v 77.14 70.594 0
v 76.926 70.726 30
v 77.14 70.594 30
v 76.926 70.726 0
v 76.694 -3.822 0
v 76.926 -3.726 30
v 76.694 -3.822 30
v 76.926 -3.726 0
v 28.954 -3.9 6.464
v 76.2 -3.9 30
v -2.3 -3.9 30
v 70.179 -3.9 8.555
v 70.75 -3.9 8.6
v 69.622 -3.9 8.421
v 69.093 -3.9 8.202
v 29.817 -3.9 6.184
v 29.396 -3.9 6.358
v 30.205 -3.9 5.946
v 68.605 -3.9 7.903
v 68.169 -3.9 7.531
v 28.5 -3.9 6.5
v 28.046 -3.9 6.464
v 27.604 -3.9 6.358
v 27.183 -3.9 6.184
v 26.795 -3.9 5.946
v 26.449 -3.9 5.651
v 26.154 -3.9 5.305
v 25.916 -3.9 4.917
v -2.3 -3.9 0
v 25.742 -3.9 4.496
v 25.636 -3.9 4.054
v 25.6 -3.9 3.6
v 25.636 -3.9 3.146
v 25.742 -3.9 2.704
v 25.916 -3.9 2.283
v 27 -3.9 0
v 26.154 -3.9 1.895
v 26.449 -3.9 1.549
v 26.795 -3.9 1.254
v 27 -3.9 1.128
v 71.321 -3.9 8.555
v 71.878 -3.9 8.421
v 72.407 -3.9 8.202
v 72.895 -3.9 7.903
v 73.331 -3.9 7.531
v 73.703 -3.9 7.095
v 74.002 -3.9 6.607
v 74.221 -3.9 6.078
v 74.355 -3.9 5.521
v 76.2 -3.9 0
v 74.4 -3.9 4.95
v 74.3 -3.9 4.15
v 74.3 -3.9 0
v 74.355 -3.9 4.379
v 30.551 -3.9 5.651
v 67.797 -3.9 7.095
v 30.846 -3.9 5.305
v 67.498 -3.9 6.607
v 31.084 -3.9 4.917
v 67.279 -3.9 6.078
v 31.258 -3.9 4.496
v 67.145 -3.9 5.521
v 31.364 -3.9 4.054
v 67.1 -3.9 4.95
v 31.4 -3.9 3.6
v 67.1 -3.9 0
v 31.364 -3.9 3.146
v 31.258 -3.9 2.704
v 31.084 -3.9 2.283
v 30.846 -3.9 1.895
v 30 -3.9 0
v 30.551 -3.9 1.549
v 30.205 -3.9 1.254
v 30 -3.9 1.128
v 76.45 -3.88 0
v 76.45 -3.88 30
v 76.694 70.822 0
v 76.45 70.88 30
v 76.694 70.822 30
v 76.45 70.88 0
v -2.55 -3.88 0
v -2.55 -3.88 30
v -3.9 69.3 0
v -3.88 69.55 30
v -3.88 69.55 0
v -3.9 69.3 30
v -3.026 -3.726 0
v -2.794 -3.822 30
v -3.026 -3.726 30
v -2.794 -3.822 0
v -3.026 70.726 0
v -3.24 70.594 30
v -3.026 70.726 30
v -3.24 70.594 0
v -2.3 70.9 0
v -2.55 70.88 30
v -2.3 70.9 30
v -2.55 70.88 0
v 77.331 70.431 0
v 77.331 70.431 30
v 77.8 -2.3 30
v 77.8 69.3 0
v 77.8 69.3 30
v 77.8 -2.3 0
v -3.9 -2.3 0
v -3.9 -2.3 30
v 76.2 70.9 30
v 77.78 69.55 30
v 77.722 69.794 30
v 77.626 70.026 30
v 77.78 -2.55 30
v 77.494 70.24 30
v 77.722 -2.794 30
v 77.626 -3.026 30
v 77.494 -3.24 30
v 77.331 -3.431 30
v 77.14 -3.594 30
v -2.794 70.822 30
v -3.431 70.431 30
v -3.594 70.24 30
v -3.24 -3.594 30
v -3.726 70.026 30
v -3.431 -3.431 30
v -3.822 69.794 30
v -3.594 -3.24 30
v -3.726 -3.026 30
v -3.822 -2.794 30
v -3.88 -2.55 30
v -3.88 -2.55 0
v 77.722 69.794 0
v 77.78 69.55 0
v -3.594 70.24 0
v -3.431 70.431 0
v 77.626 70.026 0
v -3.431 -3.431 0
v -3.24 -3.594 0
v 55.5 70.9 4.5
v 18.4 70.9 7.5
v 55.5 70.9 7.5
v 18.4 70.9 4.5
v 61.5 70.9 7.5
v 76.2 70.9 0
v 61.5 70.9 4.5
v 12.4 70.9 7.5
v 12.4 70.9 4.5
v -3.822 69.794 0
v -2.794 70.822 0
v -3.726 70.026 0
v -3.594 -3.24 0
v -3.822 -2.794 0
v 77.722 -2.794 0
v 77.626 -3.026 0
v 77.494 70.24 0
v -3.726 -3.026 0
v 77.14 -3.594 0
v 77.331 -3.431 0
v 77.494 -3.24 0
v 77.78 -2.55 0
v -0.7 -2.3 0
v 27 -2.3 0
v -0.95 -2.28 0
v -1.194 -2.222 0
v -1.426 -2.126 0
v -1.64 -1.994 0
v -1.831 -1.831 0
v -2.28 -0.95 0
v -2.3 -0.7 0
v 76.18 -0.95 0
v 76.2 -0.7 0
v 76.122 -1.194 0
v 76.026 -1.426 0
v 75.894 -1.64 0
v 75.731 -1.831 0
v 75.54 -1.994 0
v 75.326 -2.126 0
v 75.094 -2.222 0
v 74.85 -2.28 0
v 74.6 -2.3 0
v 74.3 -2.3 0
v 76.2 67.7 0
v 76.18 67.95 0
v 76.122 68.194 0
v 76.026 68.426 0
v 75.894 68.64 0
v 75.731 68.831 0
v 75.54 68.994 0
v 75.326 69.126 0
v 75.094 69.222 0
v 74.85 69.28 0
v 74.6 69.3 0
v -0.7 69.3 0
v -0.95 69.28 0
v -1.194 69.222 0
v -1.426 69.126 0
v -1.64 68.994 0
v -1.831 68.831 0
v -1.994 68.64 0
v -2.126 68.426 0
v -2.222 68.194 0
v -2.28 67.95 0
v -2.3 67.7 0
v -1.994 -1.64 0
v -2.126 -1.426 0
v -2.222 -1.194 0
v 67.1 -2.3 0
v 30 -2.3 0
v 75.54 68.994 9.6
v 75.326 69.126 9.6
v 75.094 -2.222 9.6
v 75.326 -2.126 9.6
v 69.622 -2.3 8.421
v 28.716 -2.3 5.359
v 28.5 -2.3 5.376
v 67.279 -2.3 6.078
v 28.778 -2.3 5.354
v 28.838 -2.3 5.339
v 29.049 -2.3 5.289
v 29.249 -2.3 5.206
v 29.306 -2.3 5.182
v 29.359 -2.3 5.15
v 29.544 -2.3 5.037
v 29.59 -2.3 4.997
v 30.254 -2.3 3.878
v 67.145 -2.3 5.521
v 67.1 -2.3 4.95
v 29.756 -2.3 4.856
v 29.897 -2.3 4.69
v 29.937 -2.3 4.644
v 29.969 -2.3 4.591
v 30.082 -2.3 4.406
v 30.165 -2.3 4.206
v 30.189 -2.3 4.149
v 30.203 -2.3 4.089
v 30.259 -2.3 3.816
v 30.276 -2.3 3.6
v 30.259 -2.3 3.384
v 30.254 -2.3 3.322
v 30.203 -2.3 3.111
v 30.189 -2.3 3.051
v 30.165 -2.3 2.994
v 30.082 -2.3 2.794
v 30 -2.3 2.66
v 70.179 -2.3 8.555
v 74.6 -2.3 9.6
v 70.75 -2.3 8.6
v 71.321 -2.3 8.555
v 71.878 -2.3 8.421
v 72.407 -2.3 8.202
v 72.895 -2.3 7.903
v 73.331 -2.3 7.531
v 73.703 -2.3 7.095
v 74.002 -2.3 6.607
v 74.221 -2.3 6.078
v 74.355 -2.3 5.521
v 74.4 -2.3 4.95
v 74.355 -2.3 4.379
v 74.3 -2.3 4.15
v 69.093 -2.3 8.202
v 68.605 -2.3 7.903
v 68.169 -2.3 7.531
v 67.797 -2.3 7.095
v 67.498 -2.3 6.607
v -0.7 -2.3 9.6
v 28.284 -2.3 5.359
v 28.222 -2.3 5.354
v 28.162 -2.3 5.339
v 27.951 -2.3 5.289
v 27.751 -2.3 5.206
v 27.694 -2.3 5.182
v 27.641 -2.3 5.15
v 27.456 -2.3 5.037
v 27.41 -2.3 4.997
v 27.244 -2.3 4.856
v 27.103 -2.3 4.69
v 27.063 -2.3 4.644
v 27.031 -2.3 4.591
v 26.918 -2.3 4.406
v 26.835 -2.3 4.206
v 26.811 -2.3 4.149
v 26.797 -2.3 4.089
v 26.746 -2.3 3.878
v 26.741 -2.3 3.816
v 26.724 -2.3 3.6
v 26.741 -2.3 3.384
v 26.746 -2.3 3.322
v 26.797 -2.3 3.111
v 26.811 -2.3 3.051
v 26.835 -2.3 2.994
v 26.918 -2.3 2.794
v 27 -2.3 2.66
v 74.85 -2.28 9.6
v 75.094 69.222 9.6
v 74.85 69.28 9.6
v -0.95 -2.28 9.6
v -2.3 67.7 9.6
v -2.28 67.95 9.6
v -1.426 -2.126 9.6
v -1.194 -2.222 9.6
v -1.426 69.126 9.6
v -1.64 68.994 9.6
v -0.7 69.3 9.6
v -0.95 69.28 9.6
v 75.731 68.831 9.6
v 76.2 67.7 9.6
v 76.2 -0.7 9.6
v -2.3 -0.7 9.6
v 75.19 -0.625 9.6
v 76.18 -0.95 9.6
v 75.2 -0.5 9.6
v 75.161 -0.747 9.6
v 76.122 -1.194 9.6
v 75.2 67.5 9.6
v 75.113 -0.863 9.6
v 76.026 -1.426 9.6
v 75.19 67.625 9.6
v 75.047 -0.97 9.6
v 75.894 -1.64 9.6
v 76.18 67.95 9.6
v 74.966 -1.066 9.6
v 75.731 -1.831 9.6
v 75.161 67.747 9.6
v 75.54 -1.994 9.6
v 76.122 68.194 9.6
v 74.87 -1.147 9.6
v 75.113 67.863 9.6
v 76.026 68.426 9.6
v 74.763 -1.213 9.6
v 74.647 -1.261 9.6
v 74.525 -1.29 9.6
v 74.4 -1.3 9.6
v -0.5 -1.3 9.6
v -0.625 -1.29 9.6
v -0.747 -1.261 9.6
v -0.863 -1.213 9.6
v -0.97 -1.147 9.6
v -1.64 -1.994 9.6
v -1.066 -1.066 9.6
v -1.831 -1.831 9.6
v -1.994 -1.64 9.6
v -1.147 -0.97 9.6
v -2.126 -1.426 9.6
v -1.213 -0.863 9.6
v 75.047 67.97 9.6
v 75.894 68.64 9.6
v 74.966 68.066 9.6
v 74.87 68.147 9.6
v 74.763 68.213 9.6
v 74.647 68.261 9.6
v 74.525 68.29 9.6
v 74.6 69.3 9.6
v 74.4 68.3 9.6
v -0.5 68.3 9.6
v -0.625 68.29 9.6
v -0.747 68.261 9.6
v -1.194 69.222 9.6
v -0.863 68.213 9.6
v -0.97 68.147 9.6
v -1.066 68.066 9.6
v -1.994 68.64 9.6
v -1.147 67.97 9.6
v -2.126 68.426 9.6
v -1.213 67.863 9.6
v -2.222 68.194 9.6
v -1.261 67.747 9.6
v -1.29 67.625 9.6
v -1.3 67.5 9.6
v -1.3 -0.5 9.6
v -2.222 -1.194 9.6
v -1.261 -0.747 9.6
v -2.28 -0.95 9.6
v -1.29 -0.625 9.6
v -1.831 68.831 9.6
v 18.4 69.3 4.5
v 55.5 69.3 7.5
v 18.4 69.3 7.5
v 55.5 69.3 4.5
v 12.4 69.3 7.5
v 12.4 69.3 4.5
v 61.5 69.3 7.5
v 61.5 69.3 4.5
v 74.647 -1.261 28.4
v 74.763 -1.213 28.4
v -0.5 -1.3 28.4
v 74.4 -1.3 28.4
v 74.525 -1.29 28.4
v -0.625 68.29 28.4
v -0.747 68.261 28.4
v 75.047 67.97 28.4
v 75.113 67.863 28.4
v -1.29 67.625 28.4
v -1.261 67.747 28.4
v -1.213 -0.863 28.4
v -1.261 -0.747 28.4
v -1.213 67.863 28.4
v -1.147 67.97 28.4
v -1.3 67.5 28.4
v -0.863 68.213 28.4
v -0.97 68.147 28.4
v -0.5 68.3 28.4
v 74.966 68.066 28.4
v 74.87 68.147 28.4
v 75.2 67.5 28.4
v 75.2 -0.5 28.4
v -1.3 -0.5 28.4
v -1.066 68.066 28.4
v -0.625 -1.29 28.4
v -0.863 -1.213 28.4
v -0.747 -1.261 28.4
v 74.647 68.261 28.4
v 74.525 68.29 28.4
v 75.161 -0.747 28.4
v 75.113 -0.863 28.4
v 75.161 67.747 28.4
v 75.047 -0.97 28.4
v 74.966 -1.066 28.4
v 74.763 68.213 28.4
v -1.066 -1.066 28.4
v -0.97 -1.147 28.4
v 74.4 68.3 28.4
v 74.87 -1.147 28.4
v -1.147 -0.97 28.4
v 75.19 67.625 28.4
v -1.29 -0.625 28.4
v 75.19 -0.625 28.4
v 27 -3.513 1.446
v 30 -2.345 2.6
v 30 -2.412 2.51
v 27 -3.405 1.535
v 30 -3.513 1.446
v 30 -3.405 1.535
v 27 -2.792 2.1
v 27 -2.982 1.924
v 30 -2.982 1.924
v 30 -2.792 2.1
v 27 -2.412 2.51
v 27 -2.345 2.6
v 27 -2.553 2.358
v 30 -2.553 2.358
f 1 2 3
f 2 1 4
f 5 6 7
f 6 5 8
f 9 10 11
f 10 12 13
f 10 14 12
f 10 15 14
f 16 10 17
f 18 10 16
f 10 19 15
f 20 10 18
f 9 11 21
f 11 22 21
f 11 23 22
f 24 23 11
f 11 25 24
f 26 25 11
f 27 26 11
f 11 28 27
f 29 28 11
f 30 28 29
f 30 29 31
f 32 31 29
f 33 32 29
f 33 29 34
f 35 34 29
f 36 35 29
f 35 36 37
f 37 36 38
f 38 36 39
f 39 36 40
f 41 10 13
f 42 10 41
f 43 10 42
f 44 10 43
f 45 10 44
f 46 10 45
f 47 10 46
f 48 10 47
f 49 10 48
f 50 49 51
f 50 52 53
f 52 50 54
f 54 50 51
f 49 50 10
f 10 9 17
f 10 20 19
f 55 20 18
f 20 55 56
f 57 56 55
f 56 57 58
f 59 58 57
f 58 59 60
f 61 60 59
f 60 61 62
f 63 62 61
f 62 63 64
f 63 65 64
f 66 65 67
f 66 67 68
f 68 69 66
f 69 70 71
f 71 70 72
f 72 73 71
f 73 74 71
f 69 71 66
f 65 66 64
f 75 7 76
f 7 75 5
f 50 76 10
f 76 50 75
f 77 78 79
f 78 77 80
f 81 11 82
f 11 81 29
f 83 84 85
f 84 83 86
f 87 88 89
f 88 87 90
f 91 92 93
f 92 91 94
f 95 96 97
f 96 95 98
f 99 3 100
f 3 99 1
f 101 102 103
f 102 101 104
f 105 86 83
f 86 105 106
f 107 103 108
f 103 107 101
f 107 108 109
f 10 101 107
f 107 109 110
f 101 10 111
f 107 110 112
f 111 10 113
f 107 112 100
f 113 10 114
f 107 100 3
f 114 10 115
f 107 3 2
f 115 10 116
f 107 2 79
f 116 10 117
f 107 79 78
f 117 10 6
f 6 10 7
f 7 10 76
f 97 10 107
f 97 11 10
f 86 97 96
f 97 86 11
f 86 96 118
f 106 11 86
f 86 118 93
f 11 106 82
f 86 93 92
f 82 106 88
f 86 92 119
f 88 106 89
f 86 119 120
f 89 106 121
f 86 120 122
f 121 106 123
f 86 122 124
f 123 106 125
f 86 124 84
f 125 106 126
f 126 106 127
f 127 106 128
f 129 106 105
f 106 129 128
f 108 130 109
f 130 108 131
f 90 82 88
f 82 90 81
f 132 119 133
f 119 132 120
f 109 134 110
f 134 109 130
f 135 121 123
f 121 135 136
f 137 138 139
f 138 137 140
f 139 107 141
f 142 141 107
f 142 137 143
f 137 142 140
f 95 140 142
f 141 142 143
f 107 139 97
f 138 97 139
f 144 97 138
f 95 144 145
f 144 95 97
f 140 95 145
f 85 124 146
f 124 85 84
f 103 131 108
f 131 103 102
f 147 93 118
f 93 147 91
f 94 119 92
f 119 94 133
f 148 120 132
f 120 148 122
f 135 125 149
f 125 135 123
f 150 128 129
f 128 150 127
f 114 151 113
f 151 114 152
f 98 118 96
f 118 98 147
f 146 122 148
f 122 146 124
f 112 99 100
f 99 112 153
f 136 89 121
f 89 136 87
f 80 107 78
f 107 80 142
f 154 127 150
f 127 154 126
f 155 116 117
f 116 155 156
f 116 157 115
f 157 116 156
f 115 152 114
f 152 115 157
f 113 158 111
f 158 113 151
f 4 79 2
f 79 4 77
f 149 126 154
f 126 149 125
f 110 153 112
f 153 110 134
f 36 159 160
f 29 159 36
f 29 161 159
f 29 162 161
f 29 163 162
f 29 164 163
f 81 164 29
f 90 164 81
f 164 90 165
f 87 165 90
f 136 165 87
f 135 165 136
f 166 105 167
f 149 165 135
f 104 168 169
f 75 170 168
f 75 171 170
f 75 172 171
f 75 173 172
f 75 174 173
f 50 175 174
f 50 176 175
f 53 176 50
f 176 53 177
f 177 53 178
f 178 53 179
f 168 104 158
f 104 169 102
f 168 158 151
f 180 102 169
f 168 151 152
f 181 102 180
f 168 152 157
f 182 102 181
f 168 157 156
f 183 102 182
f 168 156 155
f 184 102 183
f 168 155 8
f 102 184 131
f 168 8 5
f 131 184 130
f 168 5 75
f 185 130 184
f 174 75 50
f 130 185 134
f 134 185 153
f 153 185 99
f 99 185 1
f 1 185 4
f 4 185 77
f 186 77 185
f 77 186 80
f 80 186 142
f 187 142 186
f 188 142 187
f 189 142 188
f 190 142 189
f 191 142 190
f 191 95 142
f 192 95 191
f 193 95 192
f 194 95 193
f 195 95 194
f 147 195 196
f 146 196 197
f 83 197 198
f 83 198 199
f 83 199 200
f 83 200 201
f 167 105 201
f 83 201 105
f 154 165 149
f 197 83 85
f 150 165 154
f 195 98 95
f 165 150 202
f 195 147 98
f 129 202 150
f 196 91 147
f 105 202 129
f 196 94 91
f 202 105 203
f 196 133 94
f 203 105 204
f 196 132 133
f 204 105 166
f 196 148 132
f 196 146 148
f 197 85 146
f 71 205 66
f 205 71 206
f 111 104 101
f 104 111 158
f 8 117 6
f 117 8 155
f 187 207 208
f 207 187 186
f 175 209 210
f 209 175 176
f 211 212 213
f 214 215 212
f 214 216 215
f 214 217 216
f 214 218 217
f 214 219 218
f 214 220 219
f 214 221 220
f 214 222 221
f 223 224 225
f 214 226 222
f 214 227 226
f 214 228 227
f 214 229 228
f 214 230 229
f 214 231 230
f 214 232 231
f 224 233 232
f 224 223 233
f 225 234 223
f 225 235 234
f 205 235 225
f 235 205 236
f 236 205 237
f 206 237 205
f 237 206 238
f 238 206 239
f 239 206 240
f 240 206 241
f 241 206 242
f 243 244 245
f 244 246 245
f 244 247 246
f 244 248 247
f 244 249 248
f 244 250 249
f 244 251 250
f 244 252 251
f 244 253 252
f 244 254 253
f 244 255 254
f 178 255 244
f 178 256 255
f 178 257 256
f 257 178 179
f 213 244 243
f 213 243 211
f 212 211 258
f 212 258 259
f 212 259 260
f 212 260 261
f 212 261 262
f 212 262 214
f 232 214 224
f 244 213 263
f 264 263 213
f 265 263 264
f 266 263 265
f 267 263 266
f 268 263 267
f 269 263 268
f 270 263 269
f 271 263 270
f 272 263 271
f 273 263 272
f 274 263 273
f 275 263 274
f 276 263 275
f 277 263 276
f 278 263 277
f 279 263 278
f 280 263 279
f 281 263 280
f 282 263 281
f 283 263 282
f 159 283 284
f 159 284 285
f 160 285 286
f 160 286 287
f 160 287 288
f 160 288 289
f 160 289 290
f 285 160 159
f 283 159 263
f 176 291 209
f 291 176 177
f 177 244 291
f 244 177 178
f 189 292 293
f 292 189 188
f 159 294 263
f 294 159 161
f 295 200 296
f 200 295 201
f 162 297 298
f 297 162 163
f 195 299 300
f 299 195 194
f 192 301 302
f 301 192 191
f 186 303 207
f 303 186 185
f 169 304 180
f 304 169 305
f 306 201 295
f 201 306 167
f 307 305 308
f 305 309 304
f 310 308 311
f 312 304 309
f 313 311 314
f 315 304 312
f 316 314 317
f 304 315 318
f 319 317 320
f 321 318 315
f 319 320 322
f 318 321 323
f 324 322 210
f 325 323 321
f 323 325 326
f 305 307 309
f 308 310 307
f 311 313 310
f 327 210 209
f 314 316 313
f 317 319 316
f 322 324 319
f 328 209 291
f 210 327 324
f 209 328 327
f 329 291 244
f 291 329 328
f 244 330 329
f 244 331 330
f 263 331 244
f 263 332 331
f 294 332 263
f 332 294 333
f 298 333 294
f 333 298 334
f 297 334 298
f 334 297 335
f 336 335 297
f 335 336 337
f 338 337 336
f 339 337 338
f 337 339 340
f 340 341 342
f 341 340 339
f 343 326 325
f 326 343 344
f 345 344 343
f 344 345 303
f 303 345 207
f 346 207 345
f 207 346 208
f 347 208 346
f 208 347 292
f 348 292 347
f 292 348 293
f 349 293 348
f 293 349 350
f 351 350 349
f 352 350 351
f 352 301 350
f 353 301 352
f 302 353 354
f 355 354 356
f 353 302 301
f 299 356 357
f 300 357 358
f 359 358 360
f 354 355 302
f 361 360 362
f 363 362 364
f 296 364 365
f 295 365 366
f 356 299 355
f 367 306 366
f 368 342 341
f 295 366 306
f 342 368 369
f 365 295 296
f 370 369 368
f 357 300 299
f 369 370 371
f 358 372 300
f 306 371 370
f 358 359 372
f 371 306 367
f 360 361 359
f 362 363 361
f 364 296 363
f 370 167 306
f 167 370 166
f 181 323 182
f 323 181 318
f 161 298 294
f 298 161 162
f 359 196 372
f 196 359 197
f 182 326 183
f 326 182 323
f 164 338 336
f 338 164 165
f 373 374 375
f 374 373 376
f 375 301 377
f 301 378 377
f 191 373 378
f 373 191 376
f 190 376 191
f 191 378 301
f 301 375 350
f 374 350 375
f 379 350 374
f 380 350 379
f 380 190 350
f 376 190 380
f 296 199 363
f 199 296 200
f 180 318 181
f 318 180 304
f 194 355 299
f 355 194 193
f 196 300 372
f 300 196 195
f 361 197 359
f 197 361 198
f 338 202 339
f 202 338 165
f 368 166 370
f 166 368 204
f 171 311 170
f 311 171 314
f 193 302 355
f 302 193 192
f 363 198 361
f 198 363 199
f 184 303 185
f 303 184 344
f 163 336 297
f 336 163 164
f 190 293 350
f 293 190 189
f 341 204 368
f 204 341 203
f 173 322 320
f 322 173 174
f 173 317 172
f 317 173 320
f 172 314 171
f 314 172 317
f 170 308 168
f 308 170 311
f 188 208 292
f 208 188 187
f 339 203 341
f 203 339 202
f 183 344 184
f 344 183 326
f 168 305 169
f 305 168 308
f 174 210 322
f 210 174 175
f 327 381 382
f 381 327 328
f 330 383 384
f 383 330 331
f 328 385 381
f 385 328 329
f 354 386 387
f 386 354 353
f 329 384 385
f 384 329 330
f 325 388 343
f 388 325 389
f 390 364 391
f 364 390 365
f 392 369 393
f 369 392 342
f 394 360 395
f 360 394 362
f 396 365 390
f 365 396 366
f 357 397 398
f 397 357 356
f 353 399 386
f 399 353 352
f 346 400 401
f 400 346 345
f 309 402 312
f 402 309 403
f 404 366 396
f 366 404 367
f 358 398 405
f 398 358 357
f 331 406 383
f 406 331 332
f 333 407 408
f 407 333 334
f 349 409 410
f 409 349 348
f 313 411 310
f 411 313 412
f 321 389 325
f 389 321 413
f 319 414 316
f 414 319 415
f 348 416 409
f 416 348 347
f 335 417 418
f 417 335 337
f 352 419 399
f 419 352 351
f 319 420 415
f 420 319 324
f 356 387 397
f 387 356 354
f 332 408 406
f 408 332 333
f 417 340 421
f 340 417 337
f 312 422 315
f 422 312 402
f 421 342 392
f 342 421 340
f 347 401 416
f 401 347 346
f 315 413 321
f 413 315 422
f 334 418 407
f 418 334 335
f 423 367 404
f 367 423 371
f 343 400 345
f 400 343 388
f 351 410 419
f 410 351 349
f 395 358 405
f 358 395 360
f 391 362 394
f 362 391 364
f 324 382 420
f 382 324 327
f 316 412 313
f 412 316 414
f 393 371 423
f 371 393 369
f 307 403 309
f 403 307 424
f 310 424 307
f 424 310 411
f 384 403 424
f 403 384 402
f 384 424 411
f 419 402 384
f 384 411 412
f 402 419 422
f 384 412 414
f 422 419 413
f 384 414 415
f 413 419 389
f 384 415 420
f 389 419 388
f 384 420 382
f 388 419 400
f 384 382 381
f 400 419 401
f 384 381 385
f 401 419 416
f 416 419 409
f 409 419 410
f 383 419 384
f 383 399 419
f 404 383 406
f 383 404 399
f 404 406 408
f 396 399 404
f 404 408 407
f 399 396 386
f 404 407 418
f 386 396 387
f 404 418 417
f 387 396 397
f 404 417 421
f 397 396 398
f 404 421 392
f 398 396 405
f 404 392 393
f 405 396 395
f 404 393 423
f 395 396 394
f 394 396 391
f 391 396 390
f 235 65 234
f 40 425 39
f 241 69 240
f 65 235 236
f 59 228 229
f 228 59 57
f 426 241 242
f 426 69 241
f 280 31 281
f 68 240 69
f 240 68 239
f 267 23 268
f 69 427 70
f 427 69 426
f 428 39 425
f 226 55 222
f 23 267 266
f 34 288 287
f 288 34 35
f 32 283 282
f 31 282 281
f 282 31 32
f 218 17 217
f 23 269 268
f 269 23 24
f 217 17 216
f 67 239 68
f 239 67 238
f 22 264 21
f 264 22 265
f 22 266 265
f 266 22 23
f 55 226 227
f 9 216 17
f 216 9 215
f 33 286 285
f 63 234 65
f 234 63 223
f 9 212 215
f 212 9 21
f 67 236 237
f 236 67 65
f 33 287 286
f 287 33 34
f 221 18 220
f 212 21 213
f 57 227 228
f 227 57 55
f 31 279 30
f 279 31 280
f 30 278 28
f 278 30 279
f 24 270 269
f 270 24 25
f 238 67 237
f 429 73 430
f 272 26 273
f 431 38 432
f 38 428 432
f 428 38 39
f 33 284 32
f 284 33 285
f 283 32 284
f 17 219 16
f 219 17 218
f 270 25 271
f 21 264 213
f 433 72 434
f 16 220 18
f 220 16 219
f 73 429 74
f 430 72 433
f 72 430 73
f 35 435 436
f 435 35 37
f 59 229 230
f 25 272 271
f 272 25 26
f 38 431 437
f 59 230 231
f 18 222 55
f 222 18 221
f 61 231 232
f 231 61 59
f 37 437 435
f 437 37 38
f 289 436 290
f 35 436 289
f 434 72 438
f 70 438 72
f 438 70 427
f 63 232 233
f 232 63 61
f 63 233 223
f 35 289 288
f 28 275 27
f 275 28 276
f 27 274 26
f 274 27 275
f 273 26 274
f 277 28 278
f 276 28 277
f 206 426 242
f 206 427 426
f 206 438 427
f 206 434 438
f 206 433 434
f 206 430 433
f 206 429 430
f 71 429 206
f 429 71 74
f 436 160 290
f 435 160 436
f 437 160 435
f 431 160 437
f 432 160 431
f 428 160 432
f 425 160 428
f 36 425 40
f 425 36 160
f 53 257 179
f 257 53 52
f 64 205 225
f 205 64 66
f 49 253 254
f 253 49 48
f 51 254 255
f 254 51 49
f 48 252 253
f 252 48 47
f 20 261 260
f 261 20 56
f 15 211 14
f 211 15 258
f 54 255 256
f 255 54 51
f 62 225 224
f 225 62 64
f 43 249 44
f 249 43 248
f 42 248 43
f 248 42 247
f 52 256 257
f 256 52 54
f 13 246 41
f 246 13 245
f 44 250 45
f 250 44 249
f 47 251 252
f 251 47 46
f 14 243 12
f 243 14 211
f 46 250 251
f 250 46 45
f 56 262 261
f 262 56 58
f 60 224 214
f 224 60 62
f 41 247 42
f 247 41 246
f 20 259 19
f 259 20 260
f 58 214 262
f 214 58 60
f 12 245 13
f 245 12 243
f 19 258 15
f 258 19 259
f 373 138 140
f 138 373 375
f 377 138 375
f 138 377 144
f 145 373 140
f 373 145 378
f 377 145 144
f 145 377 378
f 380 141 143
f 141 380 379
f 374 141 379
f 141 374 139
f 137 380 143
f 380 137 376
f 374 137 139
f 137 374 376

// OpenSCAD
// file: shared.scad
board_depth = 65;
board_width = 67;
cable_diameter = 7.3;
wall_thickness = 1.6;
board_clearance = 0.5;

inner_x = board_depth + cable_diameter + wall_thickness + 2 * board_clearance;
inner_y = board_width + 2 * board_clearance;

base_x = inner_x + 2 * wall_thickness;
base_y = inner_y + 2 * wall_thickness;
base_z = wall_thickness + 8;

initial_offset = wall_thickness + board_clearance;

$fn = 40;
// main file
include <shared.scad>

lid_height = 30;
lid_clearance = 0.2;

color("blue")
difference() {
    linear_extrude(height = lid_height) {
        offset(wall_thickness) {
            offset(delta = lid_clearance) {
                translate([-initial_offset, -initial_offset]) square([base_x, base_y]);
            }
        }
    }
    linear_extrude(height = base_z) {
        offset(wall_thickness) {
            offset(delta = lid_clearance) {
                translate([-board_clearance, -board_clearance]) square([inner_x, inner_y]);
            }
        }
    }
    translate([0,0,base_z]) linear_extrude(height = lid_height - base_z - wall_thickness) {
        offset(0.5 * wall_thickness) {
            translate([-board_clearance, -board_clearance]) square([inner_x, inner_y]);
        }
    }
    screwHeadM3();
    translate([base_y / 2 - initial_offset - 6.5, -initial_offset - wall_thickness - lid_clearance, 0]) cube(size = 3);
    // Cable cutout
    translate([board_depth + initial_offset,-5,0]) cube([cable_diameter - 0.1,10,wall_thickness - 0.3 + cable_diameter / 2]);
    rotate([90, 0, 0]) translate([board_depth + initial_offset + cable_diameter / 2, wall_thickness - 0.3 + cable_diameter / 2, 0]) cylinder(d = cable_diameter, h = 5);
    translate([14.5 - initial_offset, base_y - initial_offset, 4.5]) cube([6, 3, 3]);
    translate([base_x - 20.5 - initial_offset, base_y - initial_offset, 4.5]) cube([6, 3, 3]);
}

// M3 DIN965
module screwHeadM3() {
    screw_hole_cylinderhead_spacing = 0.1;   // Extra radius of hole around screw head.
    screw_hole_countersunk_delta = 0.2;      // Extra depth of countersunk screw hole.
    r2 = 5.6 / 2 + screw_hole_cylinderhead_spacing;
    r1 = 3 / 2 + screw_hole_cylinderhead_spacing;
    h = 1.65 + screw_hole_countersunk_delta;
  
    y_offset = initial_offset - h + wall_thickness + lid_clearance;
    rotate([90, 0, 0]) translate([base_y / 2 - initial_offset - 5, wall_thickness + 2, y_offset]) cylinder(r1 = r1, r2 = r2, h = h);
}
